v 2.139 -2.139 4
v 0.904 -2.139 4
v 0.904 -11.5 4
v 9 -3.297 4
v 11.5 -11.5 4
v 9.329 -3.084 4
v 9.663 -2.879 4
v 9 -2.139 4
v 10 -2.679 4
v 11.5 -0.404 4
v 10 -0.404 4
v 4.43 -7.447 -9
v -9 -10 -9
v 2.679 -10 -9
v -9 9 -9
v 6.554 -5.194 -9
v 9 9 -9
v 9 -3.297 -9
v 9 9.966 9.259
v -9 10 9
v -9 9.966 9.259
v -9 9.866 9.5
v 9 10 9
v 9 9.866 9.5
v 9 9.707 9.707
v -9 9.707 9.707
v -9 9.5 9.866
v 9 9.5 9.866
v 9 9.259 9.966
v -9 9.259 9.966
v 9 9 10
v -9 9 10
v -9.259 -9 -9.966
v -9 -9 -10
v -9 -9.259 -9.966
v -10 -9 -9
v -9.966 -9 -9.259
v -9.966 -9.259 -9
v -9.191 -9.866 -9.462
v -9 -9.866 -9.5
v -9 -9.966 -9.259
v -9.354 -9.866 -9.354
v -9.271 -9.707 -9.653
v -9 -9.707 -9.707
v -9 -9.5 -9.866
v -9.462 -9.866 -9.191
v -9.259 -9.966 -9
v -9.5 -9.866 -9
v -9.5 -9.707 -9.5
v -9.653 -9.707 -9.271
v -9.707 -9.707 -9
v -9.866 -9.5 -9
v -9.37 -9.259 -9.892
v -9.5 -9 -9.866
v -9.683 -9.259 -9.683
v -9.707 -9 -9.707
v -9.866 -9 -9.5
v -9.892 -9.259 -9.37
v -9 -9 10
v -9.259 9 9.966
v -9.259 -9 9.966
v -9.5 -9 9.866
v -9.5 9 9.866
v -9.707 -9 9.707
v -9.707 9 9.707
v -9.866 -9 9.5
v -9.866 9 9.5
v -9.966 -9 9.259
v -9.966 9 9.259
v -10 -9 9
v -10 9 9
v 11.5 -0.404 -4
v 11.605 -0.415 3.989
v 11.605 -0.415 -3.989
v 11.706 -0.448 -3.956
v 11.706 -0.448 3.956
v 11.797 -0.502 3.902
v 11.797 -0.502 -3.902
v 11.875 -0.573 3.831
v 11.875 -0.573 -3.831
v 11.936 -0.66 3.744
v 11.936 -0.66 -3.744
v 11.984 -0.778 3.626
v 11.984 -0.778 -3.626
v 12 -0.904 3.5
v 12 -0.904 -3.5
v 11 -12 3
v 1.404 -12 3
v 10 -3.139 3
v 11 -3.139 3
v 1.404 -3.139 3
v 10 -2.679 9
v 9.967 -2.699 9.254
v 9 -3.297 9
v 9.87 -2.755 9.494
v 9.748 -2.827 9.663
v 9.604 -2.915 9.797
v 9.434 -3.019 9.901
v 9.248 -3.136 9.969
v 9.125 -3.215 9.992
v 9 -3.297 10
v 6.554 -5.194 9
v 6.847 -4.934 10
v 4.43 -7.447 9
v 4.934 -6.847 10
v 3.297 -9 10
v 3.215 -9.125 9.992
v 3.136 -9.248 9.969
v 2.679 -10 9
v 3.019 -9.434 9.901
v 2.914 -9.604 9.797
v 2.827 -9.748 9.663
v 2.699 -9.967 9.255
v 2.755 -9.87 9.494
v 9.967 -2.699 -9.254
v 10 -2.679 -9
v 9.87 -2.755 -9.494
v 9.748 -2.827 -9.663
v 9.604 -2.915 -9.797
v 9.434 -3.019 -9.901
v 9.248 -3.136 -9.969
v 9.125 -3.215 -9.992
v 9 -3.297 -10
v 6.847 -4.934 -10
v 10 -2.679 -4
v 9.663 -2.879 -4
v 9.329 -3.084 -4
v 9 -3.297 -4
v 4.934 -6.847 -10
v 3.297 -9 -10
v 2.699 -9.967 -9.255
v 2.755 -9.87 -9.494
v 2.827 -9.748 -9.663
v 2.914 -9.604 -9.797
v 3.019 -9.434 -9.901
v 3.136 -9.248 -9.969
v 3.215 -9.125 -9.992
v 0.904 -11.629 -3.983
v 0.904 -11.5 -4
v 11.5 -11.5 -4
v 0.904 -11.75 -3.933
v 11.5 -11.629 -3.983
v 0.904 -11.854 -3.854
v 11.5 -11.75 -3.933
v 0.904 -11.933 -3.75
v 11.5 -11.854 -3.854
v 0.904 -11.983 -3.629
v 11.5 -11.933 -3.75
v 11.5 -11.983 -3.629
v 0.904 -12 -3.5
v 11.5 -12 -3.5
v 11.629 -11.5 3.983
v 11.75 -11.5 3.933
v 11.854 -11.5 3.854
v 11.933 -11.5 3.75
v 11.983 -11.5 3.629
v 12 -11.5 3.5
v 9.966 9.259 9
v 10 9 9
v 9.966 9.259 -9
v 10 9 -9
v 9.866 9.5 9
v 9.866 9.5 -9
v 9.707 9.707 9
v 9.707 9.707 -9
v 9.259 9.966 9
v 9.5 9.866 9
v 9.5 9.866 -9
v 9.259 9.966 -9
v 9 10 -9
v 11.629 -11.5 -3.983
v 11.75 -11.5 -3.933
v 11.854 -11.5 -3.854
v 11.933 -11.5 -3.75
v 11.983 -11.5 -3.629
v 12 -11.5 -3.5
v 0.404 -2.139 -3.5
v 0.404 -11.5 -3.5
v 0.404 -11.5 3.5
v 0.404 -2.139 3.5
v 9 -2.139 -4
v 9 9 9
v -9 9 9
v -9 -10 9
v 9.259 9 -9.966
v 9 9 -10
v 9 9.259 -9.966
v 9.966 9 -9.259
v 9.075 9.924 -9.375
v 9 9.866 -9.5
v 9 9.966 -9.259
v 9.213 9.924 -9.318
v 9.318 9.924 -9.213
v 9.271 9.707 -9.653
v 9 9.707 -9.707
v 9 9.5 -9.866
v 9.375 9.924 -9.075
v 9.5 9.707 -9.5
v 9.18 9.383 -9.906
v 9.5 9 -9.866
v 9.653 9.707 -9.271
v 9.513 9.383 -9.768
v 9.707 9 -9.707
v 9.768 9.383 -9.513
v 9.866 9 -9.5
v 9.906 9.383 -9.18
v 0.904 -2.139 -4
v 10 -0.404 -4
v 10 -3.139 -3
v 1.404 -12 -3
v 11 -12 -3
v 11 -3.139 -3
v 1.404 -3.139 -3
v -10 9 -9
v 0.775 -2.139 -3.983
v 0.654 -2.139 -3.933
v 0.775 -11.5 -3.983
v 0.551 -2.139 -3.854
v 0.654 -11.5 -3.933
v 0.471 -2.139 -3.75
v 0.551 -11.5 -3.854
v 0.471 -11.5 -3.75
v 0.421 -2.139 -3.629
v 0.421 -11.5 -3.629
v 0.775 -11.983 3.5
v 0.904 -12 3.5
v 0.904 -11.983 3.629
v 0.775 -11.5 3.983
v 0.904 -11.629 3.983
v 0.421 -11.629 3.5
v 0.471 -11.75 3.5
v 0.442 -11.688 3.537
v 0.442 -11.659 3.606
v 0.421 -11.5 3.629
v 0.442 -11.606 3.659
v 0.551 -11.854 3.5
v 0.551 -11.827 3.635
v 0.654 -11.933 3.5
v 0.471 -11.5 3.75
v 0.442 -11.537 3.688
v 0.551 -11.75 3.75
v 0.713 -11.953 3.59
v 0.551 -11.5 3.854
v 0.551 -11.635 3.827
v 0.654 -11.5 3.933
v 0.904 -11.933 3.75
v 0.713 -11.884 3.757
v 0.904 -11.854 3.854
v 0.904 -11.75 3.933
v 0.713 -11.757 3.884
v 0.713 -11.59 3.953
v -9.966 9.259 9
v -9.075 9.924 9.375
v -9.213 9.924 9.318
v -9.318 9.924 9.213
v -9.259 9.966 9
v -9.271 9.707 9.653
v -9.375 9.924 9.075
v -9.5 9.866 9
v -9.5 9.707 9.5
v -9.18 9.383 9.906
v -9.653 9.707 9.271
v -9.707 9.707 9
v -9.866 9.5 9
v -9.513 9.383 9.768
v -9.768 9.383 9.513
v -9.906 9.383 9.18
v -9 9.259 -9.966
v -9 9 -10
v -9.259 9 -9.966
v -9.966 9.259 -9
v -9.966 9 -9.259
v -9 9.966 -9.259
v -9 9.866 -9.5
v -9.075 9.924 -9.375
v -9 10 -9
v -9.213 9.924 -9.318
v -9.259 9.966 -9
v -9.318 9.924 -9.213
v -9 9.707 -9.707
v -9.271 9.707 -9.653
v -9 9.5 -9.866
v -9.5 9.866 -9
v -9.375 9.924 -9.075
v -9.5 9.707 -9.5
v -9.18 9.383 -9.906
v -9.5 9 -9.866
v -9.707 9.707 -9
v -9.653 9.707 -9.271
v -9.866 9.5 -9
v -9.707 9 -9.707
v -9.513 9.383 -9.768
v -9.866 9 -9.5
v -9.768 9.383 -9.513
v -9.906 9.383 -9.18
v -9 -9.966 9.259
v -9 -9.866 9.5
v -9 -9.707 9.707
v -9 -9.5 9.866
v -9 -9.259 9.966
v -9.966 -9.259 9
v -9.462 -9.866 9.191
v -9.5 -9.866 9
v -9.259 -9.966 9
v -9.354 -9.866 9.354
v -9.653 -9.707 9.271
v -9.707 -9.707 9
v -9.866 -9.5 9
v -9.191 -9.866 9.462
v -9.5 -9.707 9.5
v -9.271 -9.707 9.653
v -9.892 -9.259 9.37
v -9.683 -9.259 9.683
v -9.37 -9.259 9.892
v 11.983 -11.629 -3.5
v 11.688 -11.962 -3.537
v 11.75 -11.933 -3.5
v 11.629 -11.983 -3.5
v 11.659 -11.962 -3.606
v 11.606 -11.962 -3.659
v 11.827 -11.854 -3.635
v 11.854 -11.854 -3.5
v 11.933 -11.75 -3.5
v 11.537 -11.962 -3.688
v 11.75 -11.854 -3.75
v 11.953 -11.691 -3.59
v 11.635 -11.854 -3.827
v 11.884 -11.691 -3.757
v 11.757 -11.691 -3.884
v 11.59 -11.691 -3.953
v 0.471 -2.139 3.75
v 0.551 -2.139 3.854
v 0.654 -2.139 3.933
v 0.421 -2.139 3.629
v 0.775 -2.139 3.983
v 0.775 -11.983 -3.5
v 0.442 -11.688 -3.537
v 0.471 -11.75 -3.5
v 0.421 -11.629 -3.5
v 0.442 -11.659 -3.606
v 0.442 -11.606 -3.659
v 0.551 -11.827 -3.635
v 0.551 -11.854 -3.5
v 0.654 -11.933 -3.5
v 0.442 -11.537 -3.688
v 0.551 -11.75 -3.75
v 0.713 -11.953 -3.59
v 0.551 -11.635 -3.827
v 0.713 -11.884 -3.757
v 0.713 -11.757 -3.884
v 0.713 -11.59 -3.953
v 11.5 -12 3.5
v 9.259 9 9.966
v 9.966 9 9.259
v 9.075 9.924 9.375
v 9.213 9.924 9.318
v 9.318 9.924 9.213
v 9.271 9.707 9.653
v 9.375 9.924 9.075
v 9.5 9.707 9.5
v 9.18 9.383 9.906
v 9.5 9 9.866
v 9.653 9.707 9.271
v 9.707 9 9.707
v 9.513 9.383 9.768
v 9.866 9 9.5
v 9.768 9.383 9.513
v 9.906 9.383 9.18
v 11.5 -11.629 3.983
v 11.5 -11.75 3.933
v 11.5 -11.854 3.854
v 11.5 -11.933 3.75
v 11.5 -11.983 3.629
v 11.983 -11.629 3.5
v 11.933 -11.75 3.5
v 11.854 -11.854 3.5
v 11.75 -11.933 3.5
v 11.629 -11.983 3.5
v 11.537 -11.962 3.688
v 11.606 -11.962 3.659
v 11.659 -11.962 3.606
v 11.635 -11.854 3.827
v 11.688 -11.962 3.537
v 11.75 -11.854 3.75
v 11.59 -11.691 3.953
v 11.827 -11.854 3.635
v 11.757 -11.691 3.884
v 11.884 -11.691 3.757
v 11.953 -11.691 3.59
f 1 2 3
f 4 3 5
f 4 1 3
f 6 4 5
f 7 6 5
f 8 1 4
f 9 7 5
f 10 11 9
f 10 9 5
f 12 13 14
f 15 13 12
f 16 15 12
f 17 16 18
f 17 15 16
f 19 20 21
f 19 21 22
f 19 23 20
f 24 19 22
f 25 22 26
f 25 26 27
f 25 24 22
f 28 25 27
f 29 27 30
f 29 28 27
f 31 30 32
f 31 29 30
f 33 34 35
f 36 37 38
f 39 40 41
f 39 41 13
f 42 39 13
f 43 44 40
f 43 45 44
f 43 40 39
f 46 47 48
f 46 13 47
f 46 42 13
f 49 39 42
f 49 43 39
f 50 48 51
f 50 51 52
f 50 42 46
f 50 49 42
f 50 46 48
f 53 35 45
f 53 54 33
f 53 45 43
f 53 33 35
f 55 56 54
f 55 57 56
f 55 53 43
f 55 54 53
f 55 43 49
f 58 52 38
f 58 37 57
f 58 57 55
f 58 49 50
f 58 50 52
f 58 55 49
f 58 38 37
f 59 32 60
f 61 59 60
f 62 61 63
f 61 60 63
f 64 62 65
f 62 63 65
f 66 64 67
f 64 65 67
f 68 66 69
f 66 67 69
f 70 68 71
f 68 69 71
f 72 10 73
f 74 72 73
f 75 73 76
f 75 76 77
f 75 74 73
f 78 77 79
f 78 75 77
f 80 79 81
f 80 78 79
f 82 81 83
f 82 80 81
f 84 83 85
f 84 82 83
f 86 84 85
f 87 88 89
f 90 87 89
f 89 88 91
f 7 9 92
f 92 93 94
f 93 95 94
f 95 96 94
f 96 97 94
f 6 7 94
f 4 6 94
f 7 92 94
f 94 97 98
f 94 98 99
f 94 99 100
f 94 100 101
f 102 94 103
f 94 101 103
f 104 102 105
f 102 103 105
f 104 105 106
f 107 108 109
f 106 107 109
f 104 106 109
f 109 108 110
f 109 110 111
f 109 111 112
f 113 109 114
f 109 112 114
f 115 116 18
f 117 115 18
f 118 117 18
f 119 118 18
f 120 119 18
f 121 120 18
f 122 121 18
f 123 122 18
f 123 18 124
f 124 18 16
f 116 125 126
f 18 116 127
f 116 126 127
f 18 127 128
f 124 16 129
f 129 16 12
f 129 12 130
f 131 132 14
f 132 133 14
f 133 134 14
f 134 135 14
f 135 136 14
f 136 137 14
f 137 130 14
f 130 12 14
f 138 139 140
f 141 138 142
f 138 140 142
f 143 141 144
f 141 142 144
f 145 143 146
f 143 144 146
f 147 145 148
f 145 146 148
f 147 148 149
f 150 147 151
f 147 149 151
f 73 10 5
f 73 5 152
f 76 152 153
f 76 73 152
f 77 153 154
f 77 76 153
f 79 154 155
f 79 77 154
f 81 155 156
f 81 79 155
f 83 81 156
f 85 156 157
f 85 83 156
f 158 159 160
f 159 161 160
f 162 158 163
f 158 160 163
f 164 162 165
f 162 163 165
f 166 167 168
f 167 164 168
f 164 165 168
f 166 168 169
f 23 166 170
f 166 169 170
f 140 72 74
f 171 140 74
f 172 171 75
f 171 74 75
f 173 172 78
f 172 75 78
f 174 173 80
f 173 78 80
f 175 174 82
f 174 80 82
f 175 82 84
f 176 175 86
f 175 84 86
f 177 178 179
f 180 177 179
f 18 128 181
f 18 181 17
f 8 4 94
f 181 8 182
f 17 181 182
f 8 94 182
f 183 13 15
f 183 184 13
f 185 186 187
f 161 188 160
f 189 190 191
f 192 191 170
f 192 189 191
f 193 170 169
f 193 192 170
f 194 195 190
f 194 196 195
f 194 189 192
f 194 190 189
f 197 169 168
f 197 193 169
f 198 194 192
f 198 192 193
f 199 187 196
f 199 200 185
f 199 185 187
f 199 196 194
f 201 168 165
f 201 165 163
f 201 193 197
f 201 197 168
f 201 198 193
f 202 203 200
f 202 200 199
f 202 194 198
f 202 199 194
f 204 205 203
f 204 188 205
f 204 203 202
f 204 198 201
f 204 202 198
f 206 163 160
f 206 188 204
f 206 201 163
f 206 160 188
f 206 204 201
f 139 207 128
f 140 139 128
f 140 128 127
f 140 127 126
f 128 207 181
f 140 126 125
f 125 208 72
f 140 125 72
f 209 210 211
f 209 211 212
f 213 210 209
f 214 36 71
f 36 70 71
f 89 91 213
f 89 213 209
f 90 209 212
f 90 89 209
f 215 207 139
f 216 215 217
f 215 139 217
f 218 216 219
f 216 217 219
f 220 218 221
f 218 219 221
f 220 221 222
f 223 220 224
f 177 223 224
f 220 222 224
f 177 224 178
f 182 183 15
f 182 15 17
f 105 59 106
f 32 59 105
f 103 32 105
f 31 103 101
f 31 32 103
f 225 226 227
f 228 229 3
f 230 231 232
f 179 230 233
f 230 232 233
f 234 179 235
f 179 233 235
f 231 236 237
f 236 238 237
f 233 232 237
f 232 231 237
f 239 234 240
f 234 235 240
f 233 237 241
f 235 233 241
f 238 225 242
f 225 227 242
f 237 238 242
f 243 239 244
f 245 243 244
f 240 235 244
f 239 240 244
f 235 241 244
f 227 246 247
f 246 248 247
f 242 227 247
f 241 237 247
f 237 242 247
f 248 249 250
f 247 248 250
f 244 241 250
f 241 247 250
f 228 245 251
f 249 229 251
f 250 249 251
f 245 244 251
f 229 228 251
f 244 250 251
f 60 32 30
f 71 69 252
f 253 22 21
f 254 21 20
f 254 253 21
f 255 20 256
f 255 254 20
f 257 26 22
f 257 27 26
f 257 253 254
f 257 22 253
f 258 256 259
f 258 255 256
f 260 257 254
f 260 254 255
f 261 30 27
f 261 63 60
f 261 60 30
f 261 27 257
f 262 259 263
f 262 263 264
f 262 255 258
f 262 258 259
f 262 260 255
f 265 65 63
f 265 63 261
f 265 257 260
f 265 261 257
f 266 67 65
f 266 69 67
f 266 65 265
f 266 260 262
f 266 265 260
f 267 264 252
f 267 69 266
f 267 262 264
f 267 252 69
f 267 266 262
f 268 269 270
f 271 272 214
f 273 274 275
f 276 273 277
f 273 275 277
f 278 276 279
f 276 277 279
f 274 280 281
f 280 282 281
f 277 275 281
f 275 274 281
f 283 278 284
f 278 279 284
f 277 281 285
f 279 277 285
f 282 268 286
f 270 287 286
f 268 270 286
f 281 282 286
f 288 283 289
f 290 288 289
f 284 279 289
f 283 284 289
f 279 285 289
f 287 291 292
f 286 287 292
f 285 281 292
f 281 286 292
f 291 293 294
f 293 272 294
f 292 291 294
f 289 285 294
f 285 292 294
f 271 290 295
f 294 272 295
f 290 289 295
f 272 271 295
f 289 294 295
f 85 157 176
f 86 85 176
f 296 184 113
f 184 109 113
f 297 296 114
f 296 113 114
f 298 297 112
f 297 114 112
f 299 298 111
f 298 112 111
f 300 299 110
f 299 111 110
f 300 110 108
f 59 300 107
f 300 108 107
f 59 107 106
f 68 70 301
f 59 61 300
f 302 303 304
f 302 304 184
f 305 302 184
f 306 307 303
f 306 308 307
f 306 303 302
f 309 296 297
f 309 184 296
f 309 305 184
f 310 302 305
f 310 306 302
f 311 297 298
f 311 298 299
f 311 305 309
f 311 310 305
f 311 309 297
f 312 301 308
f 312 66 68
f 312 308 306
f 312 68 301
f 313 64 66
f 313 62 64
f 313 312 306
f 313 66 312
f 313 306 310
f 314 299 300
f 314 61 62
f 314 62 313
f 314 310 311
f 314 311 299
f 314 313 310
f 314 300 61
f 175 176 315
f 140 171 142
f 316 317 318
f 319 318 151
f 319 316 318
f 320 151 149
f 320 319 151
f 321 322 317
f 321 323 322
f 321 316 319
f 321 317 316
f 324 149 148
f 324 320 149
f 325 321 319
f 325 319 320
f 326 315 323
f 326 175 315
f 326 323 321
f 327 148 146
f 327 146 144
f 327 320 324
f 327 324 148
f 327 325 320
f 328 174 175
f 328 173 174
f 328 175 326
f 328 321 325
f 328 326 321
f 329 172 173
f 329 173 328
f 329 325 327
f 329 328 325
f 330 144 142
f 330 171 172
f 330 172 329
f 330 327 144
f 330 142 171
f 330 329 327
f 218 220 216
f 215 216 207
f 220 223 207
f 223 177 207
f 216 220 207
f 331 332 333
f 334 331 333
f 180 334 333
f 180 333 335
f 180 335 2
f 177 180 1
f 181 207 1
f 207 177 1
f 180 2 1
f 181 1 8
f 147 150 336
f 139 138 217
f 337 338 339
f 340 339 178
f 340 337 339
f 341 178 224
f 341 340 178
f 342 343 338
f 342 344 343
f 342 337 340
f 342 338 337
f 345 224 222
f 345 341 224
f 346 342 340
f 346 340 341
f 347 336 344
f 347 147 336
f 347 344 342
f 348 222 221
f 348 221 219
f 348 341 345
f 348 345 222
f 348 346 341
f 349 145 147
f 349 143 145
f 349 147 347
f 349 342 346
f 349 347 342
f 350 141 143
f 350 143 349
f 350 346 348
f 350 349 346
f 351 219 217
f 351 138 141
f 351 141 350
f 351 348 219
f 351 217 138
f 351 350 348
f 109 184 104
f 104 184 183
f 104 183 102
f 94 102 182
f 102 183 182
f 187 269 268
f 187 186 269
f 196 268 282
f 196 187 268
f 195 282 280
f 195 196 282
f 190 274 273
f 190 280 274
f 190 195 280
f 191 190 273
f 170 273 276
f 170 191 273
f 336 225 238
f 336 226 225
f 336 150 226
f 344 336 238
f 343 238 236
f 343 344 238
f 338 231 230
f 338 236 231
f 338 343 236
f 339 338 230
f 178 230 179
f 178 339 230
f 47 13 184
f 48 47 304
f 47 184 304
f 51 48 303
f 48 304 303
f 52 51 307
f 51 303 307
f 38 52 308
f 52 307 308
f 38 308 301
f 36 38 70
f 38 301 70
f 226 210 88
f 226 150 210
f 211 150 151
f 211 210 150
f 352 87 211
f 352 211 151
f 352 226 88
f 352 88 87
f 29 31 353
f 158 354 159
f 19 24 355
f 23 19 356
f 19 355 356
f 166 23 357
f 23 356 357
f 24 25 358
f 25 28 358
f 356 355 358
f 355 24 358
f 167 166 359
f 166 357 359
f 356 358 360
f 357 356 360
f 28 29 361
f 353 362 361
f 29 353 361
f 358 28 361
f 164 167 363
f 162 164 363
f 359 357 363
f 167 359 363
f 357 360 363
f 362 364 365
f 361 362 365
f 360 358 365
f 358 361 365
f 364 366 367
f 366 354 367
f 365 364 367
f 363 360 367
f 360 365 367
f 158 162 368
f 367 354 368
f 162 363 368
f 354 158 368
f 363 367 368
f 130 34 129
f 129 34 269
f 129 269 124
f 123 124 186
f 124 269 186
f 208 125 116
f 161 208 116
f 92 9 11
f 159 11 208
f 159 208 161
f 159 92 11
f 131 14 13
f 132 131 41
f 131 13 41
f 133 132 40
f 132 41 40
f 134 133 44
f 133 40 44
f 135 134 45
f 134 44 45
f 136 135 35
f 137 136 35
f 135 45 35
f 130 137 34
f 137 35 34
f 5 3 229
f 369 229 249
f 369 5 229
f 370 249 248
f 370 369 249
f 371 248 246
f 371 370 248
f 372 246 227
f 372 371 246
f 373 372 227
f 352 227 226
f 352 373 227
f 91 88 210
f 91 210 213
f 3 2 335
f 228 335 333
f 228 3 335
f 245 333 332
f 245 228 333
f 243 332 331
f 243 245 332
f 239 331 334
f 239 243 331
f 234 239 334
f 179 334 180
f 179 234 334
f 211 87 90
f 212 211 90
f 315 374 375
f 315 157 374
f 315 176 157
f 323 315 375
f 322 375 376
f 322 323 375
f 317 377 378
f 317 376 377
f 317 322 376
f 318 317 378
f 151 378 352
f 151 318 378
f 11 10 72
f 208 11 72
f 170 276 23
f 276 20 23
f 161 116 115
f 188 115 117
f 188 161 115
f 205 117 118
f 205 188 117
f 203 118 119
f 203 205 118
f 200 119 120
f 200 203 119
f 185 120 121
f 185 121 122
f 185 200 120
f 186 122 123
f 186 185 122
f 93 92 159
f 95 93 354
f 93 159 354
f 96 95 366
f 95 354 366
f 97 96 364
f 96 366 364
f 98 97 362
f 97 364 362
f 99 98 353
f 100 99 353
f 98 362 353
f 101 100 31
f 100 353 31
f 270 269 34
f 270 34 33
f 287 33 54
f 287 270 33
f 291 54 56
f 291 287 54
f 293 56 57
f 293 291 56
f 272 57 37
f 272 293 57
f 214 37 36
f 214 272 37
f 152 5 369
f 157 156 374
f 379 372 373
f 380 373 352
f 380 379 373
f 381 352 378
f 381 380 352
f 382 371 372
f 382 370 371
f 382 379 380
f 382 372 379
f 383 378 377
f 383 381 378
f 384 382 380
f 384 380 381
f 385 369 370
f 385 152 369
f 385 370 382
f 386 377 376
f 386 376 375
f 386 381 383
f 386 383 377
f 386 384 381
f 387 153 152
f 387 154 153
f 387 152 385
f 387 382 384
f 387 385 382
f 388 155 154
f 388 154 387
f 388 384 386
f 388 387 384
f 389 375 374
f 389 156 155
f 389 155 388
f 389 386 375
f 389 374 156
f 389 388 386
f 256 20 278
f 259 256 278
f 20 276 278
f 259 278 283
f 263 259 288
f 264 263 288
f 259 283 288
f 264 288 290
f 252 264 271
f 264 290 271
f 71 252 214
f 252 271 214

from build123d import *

# Parameters (mm, degrees)
IZIM1_W                     = 20
IZIM1_H                     = 20
Y_KSEKLIK_EKSTR_ZYON1_DEPTH = 10
BO_ALTMA1_T                 = -1
IZIM2_R                     = 20
KES_EKSTR_ZYON1_DEPTH       = 29
Y_KSEKLIK_EKSTR_ZYON2_DEPTH = 4
Y_KSEKLIK_EKSTR_ZYON3_REACH = 29.441
IZIM4_W                     = 8
IZIM4_H                     = 1.735346843
Y_KSEKLIK_EKSTR_ZYON4_START = -10.860571
IZIM6_W                     = 1.735346843
IZIM6_H                     = 8
Y_KSEKLIK_EKSTR_ZYON4_DEPTH = 10.860571
BO_ALTMA2_START             = 1.404082058
BO_ALTMA2_OUTLINE_W         = 9.860571099
BO_ALTMA2_OUTLINE_H         = 6
BO_ALTMA2_DEPTH             = 9.595917942
BO_ALTMA2_START_2           = 10
BO_ALTMA2_2_OUTLINE_W       = 1.735346843
BO_ALTMA2_2_OUTLINE_H       = 6
BO_ALTMA2_2_DEPTH           = 1
IZIM7_W                     = 1
IZIM7_H                     = 6
Y_KSEKLIK_EKSTR_ZYON5_DEPTH = 1.735346843
RADYUS1_R                   = 1
RADYUS2_R                   = 1
IZIM8_W                     = 12.756136784
IZIM8_H                     = 3
KES_EKSTR_ZYON2_DEPTH       = 10
RADYUS3_R                   = 0.5


# Read off the part's stored shape, not the designer's step: __ İç Boşaltma2
with BuildPart() as part:
    # Çizim1 → Yükseklik-Ekstrüzyon1 (new, symmetric)
    with BuildSketch(Plane.XY):
        Rectangle(IZIM1_W, IZIM1_H)
    extrude(amount=Y_KSEKLIK_EKSTR_ZYON1_DEPTH, both=True)

    # İç Boşaltma1
    bo_altma1_openings = [part.faces().sort_by_distance(p)[0] for p in [
        (0, -10, 0),
    ]]
    offset(amount=BO_ALTMA1_T, openings=bo_altma1_openings, kind=Kind.INTERSECTION)

    # Çizim2 → Kes-Ekstrüzyon1 (cut)
    with BuildSketch(Plane.XY.offset(10)):
        with Locations((20, -20)):
            Circle(IZIM2_R)
    extrude(amount=-KES_EKSTR_ZYON1_DEPTH, mode=Mode.SUBTRACT)

    # Çizim3 → Yükseklik-Ekstrüzyon2 (add, symmetric)
    with BuildSketch(Plane.XY):
        Polygon((10, -2.139428901), (12, -2.139428901), (12, -13), (2.139428901, -13), (2.139428901, -11), (2.139428901, -2.139428901), align=None)
    extrude(amount=Y_KSEKLIK_EKSTR_ZYON2_DEPTH, both=True)

    # Çizim4 → Yükseklik-Ekstrüzyon3 (add, up to next)
    with BuildSketch(Plane(origin=(12, 0, 0), x_dir=(0, 0, -1), z_dir=(1, 0, 0)), mode=Mode.PRIVATE) as y_kseklik_ekstr_zyon3_sk1:
        with Locations((0, -1.27175548)):
            Rectangle(IZIM4_W, IZIM4_H)
    y_kseklik_ekstr_zyon3_tool1 = extrude(y_kseklik_ekstr_zyon3_sk1.sketch, amount=-Y_KSEKLIK_EKSTR_ZYON3_REACH, mode=Mode.PRIVATE) - part.part
    add(y_kseklik_ekstr_zyon3_tool1.solids().sort_by_distance((12, -1.271755, 0))[0])

    # Çizim6 → Yükseklik-Ekstrüzyon4 (add)
    with BuildSketch(Plane.XZ.offset(13).offset(Y_KSEKLIK_EKSTR_ZYON4_START)):
        with Locations((1.27175548, 0)):
            Rectangle(IZIM6_W, IZIM6_H)
    extrude(amount=Y_KSEKLIK_EKSTR_ZYON4_DEPTH)

    # İç Boşaltma2 outline → İç Boşaltma2 (cut)
    with BuildSketch(Plane.YZ.offset(BO_ALTMA2_START)):
        with Locations((-8.06971445, 0)):
            Rectangle(BO_ALTMA2_OUTLINE_W, BO_ALTMA2_OUTLINE_H)
    extrude(amount=BO_ALTMA2_DEPTH, mode=Mode.SUBTRACT)

    # Bo_altma2 2 outline → Bo_altma2 2 (cut)
    with BuildSketch(Plane.YZ.offset(BO_ALTMA2_START_2)):
        with Locations((-2.27175548, 0)):
            Rectangle(BO_ALTMA2_2_OUTLINE_W, BO_ALTMA2_2_OUTLINE_H)
    extrude(amount=BO_ALTMA2_2_DEPTH, mode=Mode.SUBTRACT)

    # Çizim7 → Yükseklik-Ekstrüzyon5 (add)
    with BuildSketch(Plane.XZ.offset(3.139428901)):
        with Locations((10.5, 0)):
            Rectangle(IZIM7_W, IZIM7_H)
    extrude(amount=-Y_KSEKLIK_EKSTR_ZYON5_DEPTH)

    # Radyus1
    radyus1_edges = [part.edges().sort_by_distance(p)[0] for p in [
        (-10, 0, 10),
        (10, 3.660254038, -10),
        (10, 3.660254038, 10),
        (-10, 0, -10),
        (0, 10, -10),
        (0, 10, 10),
        (-10, 10, 0),
        (10, 10, 0),
    ]]
    fillet(radyus1_edges, radius=RADYUS1_R)

    # Radyus2
    radyus2_edges = [part.edges().sort_by_distance(p)[0] for p in [
        (-3.160254038, -10, 10),
        (-9.707106781, -10, 9.707106781),
        (-3.160254038, -10, -10),
        (-9.707106781, -10, -9.707106781),
        (-10, -10, 0),
    ]]
    fillet(radyus2_edges, radius=RADYUS2_R - 0.0001)  # a hair under: the kernel refuses the full size

    # Çizim8 → Kes-Ekstrüzyon2 (cut)
    with BuildSketch(Plane.XY.offset(4)):
        with Locations((6.78215045, -13.5)):
            Rectangle(IZIM8_W, IZIM8_H)
    extrude(amount=-KES_EKSTR_ZYON2_DEPTH, mode=Mode.SUBTRACT)

    # Radyus3
    radyus3_edges = [part.edges().sort_by_distance(p)[0] for p in [
        (12, -6.202041029, -4),
        (12, -6.202041029, 4),
        (6.202041029, -12, 4),
        (12, -12, 0),
        (6.202041029, -12, -4),
        (0.404082058, -12, 0),
        (12, -0.404082058, 0),
        (0.404082058, -7.0697145, -4),
        (0.404082058, -7.0697145, 4),
    ]]
    fillet(radyus3_edges, radius=RADYUS3_R)


solid = part.part
